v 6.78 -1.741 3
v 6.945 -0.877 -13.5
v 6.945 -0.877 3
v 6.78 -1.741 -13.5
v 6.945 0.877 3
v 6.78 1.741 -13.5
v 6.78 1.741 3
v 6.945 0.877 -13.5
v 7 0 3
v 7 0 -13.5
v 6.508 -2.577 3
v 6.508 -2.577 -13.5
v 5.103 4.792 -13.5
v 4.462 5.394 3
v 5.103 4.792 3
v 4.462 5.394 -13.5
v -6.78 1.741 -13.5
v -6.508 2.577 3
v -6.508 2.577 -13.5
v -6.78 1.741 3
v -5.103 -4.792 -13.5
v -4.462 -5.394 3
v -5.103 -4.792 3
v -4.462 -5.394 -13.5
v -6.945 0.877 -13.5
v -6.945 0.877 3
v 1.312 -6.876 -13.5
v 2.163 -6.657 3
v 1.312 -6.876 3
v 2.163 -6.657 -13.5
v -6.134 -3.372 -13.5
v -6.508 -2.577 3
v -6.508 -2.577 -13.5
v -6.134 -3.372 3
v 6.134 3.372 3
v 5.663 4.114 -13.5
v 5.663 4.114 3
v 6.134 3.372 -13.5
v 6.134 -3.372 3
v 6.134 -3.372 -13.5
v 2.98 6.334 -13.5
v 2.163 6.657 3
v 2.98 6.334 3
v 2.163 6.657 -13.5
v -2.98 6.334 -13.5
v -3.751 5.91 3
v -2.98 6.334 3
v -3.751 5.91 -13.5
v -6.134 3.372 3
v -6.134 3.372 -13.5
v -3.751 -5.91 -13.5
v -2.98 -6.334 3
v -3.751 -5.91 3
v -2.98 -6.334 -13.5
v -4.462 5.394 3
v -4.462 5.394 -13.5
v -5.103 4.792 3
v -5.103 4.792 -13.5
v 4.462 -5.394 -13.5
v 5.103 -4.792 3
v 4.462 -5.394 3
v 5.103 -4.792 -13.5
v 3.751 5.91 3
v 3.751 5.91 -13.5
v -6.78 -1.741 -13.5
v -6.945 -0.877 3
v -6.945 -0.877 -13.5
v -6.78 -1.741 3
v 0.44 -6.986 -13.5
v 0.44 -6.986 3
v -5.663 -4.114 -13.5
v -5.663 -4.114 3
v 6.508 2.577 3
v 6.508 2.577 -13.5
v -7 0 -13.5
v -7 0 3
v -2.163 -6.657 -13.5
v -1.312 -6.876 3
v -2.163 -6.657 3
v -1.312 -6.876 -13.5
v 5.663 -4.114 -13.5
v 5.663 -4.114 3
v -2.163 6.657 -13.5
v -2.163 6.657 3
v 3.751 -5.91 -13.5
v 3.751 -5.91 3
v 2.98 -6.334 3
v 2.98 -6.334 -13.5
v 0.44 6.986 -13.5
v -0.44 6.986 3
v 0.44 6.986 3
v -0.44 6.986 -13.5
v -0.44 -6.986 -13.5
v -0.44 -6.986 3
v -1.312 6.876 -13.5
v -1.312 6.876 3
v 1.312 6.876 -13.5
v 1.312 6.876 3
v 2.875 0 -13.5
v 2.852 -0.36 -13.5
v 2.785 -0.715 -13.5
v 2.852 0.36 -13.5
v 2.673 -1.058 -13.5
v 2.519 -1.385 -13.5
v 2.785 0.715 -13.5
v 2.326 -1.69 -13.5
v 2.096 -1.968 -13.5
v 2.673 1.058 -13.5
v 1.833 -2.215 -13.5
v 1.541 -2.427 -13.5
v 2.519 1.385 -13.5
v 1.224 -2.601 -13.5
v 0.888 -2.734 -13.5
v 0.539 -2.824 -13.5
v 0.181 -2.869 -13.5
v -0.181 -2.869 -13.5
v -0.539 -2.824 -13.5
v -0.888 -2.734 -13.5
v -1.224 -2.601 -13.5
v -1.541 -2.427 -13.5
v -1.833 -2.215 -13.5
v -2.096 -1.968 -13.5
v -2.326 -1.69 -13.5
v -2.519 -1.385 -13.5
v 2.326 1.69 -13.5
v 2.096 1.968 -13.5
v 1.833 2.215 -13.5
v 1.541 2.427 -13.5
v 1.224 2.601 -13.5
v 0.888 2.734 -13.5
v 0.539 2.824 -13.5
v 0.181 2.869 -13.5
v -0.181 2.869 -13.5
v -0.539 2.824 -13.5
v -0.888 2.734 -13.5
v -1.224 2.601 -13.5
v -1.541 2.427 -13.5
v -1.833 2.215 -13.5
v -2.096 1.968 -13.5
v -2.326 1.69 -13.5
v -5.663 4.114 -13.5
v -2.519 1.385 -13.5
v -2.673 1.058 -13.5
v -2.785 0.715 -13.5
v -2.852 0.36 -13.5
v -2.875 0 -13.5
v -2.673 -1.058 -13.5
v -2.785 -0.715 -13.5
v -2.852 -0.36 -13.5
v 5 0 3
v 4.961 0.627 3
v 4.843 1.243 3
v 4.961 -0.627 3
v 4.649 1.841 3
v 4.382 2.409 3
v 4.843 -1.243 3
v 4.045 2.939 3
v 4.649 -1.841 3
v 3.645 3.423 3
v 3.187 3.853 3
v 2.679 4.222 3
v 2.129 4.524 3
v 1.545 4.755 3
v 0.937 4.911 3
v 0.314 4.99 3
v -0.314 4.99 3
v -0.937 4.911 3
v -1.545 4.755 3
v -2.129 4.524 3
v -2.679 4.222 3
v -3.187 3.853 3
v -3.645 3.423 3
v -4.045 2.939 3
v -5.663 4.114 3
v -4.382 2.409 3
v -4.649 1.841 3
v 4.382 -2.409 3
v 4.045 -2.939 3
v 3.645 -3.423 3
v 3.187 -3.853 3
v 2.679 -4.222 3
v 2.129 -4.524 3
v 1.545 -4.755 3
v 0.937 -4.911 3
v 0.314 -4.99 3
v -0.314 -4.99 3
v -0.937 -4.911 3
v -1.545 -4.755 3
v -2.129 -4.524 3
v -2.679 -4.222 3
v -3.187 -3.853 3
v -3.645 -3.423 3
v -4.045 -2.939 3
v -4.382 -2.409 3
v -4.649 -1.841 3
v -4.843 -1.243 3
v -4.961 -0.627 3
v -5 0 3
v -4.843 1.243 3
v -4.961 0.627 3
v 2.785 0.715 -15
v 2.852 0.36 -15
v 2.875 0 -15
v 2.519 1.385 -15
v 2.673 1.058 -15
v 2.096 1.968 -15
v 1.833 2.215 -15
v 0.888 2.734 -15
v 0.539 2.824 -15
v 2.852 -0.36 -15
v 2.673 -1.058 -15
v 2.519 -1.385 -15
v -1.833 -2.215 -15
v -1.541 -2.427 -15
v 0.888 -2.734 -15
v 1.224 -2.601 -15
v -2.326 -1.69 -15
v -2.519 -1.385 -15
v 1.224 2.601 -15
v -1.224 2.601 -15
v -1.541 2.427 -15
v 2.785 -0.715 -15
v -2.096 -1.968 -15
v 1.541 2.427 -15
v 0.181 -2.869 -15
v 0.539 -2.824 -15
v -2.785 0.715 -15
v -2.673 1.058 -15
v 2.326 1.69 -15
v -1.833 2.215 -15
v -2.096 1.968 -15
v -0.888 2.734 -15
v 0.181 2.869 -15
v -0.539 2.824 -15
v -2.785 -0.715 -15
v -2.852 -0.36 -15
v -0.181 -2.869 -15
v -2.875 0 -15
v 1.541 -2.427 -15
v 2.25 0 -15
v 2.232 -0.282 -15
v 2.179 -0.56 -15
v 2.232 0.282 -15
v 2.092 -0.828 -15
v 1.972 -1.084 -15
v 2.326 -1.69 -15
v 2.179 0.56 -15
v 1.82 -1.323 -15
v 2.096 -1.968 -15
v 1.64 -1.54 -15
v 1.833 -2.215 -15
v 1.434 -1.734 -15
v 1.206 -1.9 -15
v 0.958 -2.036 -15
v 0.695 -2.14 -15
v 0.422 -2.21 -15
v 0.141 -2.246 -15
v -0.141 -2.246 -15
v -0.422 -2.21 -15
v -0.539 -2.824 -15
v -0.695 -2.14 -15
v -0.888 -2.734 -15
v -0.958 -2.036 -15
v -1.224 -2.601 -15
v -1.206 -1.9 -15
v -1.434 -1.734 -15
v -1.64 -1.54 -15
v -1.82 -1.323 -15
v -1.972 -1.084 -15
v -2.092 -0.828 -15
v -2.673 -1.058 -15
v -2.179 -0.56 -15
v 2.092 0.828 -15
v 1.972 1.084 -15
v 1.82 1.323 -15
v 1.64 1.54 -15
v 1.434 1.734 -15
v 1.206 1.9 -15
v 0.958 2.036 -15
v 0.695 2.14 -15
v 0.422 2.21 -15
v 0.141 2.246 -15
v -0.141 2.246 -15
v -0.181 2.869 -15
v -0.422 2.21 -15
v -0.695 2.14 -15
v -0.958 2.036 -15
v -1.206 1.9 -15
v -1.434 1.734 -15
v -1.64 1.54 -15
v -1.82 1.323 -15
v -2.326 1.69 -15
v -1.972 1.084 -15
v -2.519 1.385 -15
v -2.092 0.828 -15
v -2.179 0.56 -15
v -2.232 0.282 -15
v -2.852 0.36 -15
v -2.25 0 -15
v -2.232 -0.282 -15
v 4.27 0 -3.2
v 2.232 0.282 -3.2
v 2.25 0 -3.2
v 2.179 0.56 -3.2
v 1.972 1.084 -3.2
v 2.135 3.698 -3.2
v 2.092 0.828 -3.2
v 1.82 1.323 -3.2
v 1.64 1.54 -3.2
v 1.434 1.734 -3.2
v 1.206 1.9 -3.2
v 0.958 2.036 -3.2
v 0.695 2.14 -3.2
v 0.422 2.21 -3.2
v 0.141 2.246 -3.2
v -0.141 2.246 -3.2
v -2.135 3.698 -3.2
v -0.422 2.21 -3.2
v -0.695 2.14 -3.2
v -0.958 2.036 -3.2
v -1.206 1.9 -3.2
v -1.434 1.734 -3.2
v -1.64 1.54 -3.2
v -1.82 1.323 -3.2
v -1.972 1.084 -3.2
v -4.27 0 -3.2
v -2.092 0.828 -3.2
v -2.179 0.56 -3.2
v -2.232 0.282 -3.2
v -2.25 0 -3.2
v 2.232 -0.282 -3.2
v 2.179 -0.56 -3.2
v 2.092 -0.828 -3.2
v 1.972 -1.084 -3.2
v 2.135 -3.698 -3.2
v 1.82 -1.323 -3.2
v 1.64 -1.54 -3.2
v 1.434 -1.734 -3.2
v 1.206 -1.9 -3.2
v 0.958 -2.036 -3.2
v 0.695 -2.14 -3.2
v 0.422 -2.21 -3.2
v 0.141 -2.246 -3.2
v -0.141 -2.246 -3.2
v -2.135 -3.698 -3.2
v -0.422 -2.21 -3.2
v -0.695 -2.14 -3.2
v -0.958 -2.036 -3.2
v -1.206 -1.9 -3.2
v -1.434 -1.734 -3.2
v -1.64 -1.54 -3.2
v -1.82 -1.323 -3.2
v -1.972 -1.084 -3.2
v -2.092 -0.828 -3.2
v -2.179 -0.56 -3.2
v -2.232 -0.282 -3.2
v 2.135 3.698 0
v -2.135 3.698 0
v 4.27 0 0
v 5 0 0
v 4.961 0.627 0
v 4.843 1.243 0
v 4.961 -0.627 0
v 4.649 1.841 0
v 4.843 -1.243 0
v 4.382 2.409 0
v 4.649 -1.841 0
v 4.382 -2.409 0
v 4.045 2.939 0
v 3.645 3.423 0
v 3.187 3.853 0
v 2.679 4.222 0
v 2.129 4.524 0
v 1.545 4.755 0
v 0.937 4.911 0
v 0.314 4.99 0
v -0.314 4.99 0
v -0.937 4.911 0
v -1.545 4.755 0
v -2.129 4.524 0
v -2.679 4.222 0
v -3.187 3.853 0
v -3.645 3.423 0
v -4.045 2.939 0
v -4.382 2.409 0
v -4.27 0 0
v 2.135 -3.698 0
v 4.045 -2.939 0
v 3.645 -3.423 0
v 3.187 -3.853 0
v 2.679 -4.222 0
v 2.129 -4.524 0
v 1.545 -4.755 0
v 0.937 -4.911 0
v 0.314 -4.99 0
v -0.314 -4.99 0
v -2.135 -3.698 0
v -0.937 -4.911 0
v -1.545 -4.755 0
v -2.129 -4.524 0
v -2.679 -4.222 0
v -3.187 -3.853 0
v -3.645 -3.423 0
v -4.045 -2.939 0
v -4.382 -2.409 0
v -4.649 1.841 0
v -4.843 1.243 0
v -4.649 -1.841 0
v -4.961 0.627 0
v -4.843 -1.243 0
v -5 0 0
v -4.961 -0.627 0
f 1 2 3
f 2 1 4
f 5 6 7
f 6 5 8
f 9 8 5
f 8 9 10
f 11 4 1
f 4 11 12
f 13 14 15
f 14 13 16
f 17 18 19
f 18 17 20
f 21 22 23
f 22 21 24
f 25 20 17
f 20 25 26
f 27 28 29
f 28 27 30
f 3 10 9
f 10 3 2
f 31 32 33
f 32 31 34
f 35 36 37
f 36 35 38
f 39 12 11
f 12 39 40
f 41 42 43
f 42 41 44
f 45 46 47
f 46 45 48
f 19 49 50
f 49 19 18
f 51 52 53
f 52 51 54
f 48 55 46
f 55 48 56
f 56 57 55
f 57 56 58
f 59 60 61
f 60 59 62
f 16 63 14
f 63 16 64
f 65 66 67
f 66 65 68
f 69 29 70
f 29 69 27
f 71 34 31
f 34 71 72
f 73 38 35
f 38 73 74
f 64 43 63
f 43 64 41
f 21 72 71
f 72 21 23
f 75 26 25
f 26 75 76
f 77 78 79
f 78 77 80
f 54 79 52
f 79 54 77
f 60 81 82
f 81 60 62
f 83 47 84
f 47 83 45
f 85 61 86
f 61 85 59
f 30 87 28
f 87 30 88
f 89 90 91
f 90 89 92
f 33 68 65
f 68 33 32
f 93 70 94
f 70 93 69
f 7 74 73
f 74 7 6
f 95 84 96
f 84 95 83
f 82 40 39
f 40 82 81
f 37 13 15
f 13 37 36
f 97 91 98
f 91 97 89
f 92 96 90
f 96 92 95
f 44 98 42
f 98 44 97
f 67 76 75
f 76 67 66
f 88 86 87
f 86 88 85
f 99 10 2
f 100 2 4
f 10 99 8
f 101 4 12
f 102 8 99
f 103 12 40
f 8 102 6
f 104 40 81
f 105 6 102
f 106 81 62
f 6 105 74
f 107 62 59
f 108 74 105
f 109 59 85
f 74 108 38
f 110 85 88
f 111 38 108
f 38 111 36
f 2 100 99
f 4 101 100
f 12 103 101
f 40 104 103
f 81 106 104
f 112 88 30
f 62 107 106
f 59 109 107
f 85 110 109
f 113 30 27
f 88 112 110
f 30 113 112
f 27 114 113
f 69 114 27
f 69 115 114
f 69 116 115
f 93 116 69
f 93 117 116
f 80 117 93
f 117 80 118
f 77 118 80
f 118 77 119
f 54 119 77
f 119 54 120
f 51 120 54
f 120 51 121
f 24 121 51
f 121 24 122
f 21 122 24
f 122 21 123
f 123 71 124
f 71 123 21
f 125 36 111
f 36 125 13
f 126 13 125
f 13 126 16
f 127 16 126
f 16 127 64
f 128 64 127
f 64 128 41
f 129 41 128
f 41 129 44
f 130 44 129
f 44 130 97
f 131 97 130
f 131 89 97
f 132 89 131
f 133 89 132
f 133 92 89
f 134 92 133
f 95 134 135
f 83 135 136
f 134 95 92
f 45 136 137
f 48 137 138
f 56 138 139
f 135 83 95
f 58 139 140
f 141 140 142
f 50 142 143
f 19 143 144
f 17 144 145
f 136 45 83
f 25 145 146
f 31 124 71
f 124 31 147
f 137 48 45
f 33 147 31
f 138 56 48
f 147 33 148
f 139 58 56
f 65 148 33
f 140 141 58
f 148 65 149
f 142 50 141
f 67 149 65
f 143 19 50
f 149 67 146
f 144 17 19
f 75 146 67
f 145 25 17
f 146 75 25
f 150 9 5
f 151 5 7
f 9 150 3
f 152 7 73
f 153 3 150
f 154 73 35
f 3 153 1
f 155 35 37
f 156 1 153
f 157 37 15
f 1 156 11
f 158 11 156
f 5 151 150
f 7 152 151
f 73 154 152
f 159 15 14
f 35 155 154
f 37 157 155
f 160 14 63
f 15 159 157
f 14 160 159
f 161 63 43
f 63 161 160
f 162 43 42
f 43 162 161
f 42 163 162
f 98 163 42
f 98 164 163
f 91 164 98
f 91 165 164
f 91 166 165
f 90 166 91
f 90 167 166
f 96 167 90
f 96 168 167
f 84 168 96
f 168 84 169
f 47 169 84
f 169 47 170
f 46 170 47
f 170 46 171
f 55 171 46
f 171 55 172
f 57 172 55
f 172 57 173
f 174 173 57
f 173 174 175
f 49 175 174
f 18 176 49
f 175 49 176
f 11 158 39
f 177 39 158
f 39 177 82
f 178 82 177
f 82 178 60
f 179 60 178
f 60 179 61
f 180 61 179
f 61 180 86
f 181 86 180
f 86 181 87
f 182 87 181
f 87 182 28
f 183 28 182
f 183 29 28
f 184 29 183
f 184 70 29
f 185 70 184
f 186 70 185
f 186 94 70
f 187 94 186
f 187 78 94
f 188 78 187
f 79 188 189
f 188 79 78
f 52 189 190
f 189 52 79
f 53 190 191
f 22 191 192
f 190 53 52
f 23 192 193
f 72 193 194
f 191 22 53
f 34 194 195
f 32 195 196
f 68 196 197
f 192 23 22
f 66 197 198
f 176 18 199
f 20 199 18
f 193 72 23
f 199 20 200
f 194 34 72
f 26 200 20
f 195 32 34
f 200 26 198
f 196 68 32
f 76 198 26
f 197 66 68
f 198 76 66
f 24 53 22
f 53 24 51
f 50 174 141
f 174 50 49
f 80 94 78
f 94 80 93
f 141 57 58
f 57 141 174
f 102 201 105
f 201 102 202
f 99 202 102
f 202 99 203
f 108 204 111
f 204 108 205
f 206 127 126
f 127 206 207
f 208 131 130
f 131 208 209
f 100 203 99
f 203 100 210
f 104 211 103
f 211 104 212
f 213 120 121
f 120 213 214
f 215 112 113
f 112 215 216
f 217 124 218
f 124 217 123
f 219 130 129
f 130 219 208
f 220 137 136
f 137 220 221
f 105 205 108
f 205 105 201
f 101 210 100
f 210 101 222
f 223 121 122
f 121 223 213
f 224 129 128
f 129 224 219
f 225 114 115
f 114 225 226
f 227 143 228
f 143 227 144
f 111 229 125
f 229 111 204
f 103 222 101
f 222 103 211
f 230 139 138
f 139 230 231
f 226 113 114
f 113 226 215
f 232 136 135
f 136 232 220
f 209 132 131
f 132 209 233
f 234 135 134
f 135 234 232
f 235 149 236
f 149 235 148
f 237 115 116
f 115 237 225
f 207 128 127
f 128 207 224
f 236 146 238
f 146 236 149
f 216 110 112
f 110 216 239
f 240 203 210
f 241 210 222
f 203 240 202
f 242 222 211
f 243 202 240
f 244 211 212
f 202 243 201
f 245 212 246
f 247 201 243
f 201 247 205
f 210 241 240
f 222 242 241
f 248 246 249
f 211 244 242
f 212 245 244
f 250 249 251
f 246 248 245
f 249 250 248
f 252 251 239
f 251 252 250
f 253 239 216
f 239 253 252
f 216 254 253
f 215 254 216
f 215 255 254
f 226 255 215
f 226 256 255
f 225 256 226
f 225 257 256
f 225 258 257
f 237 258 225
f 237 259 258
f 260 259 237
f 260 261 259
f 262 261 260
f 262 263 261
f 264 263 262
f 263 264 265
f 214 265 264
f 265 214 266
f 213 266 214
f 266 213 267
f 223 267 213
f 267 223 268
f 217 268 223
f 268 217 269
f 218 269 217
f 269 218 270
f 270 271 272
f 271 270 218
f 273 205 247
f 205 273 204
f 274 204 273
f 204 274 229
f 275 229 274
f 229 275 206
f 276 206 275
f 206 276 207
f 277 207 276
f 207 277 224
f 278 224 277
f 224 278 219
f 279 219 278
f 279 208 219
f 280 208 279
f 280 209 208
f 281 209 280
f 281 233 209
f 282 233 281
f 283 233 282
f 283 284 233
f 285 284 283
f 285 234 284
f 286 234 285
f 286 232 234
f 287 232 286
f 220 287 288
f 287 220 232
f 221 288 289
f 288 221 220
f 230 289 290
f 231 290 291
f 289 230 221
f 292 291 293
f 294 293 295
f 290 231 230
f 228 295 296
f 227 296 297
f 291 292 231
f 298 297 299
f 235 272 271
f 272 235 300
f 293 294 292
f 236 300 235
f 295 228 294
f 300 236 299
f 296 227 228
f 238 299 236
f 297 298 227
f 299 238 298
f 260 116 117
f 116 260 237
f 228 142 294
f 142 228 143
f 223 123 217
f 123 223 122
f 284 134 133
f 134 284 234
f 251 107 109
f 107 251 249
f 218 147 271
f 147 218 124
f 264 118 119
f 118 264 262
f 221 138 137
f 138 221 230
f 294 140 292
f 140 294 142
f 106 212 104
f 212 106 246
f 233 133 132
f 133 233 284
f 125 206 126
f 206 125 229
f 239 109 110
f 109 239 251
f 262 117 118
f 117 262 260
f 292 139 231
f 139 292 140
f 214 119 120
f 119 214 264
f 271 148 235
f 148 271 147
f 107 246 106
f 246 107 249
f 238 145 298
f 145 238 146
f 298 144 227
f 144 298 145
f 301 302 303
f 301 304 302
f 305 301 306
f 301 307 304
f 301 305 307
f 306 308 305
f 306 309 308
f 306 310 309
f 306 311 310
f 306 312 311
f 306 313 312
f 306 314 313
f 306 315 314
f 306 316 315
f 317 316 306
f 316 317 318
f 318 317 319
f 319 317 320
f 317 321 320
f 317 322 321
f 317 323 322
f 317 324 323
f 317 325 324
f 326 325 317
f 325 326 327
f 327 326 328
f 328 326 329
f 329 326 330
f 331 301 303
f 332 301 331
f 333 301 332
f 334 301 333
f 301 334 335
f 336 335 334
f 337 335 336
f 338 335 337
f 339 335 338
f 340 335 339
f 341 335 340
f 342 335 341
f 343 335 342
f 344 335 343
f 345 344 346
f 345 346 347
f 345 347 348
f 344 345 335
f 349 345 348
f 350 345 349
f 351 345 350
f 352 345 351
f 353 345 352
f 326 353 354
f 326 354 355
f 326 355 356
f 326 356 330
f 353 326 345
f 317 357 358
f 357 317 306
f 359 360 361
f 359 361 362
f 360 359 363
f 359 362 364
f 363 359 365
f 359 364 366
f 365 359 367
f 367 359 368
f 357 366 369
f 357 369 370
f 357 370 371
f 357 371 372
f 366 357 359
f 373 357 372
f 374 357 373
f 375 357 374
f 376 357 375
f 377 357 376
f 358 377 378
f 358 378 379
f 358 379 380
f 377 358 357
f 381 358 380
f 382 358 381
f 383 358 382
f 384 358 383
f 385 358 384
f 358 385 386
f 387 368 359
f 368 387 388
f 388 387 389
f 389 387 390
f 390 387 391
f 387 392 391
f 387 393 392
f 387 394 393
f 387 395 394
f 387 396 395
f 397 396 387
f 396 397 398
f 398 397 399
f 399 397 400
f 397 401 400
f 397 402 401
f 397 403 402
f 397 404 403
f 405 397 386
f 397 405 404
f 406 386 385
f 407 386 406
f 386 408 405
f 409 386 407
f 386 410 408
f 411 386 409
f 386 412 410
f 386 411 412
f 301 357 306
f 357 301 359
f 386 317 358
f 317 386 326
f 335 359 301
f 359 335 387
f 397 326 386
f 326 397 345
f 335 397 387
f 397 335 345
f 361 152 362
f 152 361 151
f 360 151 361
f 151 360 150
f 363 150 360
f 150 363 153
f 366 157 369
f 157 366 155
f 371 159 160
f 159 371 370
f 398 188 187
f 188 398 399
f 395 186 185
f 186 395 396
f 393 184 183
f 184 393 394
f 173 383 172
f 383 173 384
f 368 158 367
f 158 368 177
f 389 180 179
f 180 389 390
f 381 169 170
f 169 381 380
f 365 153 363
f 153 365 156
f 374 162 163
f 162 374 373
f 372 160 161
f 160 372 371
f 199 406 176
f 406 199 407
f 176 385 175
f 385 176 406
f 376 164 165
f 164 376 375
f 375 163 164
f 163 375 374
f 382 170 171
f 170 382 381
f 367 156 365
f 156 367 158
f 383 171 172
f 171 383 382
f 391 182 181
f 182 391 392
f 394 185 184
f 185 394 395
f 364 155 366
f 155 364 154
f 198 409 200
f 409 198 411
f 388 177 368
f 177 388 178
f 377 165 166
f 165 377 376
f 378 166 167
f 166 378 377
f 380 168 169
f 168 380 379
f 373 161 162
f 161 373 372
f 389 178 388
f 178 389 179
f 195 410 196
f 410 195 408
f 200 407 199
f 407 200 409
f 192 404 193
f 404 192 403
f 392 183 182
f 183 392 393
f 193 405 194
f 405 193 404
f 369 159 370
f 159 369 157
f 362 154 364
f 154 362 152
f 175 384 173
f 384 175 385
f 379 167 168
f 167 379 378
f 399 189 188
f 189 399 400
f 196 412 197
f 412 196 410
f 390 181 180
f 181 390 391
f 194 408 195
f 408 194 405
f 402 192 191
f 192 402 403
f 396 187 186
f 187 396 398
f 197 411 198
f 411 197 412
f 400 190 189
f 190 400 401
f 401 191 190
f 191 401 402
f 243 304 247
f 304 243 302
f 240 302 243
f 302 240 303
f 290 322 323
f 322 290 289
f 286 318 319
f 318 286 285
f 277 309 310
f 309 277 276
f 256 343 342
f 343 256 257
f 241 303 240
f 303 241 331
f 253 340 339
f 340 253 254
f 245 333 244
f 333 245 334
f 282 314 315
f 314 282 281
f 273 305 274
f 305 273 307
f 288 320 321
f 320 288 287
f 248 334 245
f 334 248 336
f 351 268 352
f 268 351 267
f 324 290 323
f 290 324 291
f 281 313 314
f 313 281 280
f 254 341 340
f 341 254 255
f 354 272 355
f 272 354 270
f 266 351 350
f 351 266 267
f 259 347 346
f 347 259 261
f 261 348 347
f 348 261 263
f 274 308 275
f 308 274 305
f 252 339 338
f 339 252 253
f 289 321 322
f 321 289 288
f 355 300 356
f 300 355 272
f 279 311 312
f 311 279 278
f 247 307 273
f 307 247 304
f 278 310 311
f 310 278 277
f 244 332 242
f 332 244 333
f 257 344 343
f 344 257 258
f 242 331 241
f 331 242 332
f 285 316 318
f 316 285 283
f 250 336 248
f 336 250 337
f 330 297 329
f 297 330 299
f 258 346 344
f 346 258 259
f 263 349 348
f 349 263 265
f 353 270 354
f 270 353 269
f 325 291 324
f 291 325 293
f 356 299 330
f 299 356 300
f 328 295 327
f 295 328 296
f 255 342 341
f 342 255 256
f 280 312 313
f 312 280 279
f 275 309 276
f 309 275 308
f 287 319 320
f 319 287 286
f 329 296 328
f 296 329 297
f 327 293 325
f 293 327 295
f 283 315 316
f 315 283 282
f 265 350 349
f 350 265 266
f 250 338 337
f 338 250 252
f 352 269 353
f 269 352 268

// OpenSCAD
$fn = 50;


difference() {
	union() {
		translate(v = [0, 0, -13.5000000000]) {
			cylinder(h = 16.5000000000, r = 7.0000000000);
		}
		#translate(v = [0, 0, -15.0000000000]) {
			cylinder(h = 15, r = 2.8750000000);
		}
	}
	union() {
		translate(v = [0, 0, 0]) {
			rotate(a = [0, 0, 0]) {
				difference() {
					union() {
						translate(v = [0, 0, -3.2000000000]) {
							linear_extrude(height = 3.2000000000) {
								polygon(points = [[4.2698000000, 0.0000000000], [2.1349000000, 3.6977552691], [-2.1349000000, 3.6977552691], [-4.2698000000, 0.0000000000], [-2.1349000000, -3.6977552691], [2.1349000000, -3.6977552691]]);
							}
						}
					}
					union();
				}
			}
		}
		#cylinder(h = 3, r = 5.0000000000);
		#translate(v = [0, 0, -100.0000000000]) {
			cylinder(h = 200, r = 2.2500000000);
		}
	}
}
